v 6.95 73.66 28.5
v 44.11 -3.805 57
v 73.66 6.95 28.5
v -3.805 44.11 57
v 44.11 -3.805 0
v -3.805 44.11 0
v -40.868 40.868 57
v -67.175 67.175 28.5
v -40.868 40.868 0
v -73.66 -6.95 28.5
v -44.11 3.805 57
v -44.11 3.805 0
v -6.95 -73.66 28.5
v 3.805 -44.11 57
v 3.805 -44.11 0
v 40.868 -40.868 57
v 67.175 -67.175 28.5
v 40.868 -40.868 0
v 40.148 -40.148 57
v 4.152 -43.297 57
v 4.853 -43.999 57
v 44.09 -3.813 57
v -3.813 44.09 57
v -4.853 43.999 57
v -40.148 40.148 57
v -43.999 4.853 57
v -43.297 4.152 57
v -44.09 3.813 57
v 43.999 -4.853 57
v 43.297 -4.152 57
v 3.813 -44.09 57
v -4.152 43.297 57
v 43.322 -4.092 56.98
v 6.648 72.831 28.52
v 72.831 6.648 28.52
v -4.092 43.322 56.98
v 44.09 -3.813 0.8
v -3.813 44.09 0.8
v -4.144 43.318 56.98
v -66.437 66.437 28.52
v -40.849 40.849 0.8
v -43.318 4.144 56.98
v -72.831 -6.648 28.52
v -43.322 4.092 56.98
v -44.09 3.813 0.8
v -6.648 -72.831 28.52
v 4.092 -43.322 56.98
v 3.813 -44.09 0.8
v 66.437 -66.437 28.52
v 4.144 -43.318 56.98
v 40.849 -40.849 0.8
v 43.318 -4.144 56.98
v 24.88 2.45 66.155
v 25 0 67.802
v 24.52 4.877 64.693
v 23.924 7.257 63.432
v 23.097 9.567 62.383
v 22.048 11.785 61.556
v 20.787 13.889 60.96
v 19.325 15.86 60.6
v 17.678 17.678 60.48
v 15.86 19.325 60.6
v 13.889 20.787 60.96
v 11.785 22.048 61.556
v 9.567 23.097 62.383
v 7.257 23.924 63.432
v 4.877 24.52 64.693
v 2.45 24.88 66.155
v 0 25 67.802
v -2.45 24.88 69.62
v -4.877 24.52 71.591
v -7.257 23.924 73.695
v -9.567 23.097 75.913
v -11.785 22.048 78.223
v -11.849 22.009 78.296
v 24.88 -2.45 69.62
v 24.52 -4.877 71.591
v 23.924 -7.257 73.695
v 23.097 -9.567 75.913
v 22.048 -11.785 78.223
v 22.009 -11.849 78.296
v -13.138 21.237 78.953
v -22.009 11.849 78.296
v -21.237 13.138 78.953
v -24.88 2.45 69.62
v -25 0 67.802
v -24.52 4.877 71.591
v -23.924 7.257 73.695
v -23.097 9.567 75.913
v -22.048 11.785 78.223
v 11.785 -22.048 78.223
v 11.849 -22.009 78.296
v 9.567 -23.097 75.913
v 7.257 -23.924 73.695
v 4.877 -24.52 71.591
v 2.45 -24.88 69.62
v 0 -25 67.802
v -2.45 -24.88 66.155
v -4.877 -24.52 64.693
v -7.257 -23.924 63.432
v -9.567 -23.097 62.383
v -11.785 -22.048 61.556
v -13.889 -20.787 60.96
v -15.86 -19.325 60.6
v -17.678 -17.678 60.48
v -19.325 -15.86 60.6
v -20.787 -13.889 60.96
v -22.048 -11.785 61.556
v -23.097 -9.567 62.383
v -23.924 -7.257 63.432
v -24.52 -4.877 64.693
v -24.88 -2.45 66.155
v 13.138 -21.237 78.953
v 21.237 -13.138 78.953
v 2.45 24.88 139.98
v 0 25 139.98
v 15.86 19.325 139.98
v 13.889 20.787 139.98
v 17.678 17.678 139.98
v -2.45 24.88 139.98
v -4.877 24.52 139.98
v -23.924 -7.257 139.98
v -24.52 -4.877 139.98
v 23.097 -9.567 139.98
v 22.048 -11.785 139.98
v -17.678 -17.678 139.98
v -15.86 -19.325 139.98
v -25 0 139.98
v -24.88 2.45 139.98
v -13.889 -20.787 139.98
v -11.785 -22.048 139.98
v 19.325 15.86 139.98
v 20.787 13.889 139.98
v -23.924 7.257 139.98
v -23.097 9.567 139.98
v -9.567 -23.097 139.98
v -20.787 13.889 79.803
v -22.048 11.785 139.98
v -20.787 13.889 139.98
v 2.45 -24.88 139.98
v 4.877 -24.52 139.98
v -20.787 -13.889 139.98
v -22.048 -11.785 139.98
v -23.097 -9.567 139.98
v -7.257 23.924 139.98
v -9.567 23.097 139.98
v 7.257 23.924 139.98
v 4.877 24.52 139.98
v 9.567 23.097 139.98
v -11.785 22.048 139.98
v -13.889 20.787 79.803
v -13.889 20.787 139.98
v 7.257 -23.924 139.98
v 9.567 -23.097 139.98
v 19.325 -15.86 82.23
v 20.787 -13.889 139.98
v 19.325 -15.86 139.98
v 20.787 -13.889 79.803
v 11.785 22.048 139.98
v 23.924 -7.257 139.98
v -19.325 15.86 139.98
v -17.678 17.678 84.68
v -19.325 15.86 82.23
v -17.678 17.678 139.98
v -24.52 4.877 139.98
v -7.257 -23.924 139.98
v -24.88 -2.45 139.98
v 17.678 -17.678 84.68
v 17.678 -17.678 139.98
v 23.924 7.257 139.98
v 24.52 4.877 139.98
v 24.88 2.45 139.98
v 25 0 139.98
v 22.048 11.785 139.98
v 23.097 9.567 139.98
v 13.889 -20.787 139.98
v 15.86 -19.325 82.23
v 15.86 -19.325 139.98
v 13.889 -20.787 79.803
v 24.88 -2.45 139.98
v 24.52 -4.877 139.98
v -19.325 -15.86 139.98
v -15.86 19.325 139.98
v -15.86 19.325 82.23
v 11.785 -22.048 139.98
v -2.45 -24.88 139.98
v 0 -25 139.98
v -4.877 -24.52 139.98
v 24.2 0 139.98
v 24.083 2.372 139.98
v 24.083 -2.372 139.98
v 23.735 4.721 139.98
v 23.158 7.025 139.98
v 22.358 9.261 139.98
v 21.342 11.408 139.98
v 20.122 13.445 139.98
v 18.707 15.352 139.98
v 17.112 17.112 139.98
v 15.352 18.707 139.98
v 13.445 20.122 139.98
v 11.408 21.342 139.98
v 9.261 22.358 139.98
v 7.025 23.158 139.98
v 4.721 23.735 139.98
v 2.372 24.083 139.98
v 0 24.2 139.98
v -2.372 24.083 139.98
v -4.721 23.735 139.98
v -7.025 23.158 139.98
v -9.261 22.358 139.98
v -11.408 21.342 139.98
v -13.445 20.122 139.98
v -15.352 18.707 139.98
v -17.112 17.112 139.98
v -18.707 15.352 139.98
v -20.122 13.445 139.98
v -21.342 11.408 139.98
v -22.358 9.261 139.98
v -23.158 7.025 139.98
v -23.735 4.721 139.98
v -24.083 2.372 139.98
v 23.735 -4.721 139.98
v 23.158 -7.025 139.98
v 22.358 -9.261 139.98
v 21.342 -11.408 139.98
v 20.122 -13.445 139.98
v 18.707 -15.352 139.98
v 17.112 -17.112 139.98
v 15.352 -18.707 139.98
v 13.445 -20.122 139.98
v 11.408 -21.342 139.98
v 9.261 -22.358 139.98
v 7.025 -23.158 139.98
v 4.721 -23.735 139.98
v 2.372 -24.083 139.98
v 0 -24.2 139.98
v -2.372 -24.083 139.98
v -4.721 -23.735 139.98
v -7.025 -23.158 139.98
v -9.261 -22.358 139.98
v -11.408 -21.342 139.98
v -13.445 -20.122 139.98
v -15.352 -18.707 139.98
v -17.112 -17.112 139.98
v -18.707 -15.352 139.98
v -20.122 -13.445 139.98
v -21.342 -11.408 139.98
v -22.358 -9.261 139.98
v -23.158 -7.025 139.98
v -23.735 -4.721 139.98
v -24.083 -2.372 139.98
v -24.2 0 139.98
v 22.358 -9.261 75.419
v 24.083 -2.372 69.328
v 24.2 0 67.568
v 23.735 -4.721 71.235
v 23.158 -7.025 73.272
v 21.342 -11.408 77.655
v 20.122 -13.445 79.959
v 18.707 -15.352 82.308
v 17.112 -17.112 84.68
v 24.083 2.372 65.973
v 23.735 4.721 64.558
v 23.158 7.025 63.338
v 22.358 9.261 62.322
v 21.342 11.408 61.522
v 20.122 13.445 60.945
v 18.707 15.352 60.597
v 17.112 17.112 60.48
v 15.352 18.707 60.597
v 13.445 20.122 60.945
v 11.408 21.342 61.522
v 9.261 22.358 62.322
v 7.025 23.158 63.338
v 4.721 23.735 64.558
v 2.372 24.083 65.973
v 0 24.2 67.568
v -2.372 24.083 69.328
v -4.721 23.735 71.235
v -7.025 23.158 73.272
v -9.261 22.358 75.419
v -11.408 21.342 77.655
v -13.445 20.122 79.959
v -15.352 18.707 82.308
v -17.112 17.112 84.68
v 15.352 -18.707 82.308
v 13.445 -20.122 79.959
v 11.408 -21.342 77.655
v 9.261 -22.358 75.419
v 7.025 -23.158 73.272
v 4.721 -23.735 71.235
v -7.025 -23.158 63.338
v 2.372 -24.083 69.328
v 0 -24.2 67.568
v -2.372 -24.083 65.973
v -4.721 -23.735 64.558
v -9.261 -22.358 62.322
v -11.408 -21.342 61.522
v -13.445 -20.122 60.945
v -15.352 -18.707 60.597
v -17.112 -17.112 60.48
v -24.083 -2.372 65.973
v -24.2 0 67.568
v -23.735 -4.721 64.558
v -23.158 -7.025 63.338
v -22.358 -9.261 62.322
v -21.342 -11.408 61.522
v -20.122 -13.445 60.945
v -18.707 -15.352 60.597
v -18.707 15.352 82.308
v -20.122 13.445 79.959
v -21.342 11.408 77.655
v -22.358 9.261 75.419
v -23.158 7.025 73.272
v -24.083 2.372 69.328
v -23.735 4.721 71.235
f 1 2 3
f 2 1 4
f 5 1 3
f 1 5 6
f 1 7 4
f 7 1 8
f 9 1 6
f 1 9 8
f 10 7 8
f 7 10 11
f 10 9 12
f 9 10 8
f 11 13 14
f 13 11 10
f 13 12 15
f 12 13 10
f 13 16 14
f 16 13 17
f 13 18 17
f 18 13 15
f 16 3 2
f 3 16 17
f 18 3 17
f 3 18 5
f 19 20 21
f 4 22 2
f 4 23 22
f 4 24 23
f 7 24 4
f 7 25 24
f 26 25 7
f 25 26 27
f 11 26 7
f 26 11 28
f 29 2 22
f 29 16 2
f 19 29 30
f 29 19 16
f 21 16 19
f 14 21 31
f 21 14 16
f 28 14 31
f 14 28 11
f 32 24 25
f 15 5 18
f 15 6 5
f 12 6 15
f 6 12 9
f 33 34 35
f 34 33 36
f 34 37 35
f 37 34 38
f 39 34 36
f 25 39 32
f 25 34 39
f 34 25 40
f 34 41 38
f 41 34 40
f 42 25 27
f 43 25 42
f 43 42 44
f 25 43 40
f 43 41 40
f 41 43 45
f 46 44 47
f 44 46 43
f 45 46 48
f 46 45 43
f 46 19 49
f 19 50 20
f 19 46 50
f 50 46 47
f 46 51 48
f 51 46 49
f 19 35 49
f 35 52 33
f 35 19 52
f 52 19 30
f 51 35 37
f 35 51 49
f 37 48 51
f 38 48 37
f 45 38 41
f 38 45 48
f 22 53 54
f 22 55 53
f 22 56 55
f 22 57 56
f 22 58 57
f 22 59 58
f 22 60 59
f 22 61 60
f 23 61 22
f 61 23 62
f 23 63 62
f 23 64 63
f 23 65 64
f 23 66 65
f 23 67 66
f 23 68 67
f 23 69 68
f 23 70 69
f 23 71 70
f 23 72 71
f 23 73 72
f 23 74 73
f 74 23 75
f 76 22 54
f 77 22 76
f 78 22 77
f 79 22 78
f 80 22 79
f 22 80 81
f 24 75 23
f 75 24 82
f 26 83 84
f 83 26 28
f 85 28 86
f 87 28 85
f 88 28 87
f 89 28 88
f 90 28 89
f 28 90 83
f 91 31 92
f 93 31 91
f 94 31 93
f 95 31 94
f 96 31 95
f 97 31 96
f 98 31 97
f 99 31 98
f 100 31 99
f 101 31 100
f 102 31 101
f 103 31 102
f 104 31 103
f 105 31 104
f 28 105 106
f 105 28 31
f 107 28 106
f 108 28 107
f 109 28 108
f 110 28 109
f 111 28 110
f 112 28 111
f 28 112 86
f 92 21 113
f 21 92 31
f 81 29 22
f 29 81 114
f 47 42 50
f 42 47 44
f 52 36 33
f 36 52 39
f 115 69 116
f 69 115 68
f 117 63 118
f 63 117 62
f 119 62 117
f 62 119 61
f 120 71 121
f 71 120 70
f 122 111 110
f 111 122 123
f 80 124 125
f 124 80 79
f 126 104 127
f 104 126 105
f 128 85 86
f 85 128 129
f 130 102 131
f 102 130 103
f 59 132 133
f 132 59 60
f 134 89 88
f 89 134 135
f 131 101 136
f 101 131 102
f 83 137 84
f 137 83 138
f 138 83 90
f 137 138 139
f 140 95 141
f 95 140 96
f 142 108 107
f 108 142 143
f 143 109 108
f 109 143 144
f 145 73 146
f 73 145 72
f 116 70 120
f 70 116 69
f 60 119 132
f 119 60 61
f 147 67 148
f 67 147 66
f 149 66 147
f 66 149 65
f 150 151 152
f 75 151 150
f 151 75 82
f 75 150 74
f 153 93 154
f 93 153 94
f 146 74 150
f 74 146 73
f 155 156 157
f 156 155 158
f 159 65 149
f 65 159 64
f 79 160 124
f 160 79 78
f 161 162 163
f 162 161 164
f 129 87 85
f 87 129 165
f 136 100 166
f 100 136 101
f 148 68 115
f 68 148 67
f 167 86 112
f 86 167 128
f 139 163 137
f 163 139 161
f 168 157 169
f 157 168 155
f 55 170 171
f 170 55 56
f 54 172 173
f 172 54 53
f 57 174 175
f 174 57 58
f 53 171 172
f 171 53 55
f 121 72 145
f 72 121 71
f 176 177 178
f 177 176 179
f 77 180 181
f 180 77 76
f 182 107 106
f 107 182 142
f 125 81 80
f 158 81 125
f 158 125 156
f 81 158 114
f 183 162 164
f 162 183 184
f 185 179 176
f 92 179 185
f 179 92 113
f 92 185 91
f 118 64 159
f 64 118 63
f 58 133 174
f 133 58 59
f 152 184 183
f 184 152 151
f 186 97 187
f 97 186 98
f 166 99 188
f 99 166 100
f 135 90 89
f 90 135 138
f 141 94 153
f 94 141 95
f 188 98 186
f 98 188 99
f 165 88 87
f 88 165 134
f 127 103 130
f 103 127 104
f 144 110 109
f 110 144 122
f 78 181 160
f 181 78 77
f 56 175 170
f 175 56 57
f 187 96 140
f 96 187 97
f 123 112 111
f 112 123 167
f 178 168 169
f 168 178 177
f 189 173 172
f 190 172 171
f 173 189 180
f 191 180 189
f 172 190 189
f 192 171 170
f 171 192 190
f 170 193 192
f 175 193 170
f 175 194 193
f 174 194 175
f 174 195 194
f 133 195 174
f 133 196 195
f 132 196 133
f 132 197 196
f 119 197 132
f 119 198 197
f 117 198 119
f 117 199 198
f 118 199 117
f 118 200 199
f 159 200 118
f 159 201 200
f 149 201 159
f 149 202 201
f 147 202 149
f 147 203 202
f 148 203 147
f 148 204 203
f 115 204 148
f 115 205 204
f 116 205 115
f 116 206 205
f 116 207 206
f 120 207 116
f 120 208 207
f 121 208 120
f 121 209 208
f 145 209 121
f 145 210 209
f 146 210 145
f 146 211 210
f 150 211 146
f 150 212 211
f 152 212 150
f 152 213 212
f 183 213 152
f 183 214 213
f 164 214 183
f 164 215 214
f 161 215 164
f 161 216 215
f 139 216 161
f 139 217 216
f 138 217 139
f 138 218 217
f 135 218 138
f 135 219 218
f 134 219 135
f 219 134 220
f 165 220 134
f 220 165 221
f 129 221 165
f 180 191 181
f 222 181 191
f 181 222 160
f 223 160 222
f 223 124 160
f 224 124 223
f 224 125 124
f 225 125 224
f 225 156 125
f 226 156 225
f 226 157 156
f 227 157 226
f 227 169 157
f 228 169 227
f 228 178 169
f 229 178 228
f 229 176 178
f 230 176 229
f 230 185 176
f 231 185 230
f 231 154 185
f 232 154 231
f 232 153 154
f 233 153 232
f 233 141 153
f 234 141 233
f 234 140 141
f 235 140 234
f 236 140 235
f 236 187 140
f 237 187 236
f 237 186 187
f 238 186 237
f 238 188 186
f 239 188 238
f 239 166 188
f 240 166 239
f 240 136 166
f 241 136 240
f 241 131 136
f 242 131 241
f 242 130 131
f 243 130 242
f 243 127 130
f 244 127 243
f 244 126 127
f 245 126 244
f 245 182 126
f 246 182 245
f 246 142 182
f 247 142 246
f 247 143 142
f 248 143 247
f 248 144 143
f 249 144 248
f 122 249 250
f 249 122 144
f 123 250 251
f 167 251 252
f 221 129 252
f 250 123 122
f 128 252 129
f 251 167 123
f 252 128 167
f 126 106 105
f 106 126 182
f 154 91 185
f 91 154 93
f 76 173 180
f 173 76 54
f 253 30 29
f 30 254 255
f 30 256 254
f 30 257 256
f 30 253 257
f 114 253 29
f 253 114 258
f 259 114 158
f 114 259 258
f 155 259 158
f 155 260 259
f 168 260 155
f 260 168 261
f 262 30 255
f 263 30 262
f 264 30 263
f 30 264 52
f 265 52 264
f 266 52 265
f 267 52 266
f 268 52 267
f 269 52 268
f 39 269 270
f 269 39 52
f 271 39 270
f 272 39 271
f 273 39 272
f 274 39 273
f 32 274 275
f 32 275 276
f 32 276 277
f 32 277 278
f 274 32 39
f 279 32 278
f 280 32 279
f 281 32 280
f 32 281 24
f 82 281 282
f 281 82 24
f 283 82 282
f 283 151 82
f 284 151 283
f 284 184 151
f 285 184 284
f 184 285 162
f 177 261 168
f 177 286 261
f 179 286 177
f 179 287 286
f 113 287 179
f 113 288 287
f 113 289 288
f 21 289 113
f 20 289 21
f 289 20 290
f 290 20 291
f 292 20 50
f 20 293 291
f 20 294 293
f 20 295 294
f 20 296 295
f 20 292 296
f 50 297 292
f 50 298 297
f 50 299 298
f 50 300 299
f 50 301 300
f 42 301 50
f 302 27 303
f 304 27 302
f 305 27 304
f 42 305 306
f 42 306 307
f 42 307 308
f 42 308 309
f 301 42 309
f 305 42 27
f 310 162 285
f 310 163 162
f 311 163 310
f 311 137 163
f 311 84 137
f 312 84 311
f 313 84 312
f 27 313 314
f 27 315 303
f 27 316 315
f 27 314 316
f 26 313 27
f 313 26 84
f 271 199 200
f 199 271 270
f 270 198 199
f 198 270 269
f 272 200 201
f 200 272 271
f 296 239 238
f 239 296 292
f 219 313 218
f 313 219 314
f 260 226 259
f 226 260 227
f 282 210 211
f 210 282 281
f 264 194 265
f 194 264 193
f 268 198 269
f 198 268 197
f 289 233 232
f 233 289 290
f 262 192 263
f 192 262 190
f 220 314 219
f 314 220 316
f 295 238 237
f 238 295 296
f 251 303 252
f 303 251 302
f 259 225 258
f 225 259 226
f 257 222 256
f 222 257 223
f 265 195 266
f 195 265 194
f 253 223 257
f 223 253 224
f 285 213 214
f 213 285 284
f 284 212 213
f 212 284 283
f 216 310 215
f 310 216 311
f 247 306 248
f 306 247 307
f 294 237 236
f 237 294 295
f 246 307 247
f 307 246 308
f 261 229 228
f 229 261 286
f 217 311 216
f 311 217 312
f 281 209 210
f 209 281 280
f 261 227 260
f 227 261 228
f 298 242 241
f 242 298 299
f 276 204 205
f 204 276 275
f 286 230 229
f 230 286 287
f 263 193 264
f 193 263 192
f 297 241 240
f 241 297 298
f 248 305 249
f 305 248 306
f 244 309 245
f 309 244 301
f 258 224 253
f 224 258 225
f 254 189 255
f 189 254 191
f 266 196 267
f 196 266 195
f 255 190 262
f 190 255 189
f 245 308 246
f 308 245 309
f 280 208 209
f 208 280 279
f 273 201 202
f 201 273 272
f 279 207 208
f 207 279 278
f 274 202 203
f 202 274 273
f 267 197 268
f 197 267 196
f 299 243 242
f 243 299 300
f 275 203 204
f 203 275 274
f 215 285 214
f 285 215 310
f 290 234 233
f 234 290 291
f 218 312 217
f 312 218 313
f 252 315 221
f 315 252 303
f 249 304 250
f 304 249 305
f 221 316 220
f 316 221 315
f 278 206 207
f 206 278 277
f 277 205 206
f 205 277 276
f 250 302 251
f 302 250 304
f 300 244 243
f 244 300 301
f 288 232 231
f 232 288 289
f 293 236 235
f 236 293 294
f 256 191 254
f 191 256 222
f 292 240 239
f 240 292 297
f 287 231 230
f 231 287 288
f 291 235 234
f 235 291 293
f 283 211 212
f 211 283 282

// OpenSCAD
// [FL_INDEX: keywords="openscad, 3d_parametric, Customizable_Rupee_Lamp_Shade, csg_solid" | COT="Parametric OpenSCAD design from 3DCodeverse"]
// Title: Customizable Rupee Lamp Shade

//----- Customizable constants

// preview[view:south, tilt:top]

/* [Printer/Slicer] */

// of the target printer
nozzle_diameter= 0.4;

// to be used by the slicer
layer_height= 0.2;

/* [Rupee Shape] */

rupee_length= 190;
rupee_edge_pitch= 45;
rupee_tip_angle= 100;
rupee_aspect_ratio= 0.6;
rupee_center_facet_ratio= 0.5;

rupee_bowl_wall_count= 2;
rupee_bowl_floor_count= 4; // NOTE: An even number of layers promotes symmetry on the central facet.

/* [Light Socket Connector] */

rupee_shade_total_height= 140;

light_socket_connector_top_diameter= 50;
light_socket_connector_face_count= 64;

/* [Hidden] */

// The connector slits was both unnecessary and created problems while printing.
light_socket_connector_slit_xy_size= 0; // 0 will remove the slit entirely. 

// The magnets turned out to be unnecessary, so it's completely untested.
light_socket_connector_magnet_count= 0;
magnet_diameter= 5.0;
magnet_socket_xy_gap= 0.1;
magnet_socket_z_gap= 0.2;
magnet_socket_wall_count= 2;
magnet_socket_floor_count= 2;
magnet_socket_ceiling_count= 2; // Either 0 if glueing in magnets, or just thick enough to ensure the magnets are contained.
magnet_socket_support_pitch= 45;
magnet_socket_face_count= 64;

//----- Private constants

function hidden(x)= x; // Used to hide values from the customizer app.

csg_overlap= hidden(0.02);

rupee_bowl_wall_xy_size= (nozzle_diameter * rupee_bowl_wall_count);
rupee_bowl_floor_z_size= (layer_height * rupee_bowl_floor_count);

rupee_y_size= rupee_length;
rupee_x_size= (rupee_y_size * rupee_aspect_ratio);

rupee_center_facet_x_size= (rupee_center_facet_ratio * rupee_x_size);

rupee_edge_facet_x_size= ((rupee_x_size / 2) - (rupee_center_facet_x_size / 2));
rupee_edge_facet_z_size= (rupee_edge_facet_x_size * tan(rupee_edge_pitch));

rupee_z_size= (2 * rupee_edge_facet_z_size);

rupee_max_size= (max(rupee_x_size, rupee_y_size, rupee_z_size) + (2 * csg_overlap));

light_socket_connector_z_size= (rupee_shade_total_height - rupee_z_size);

light_socket_connector_top_radius= (light_socket_connector_top_diameter / 2);

magnet_socket_cavity_xy_radius= ((magnet_diameter / 2) + magnet_socket_xy_gap);
magnet_socket_cavity_z_size= (magnet_socket_z_gap + magnet_diameter + magnet_socket_z_gap);
magnet_socket_wall_xy_size= (nozzle_diameter * magnet_socket_wall_count);
magnet_socket_floor_z_size= (layer_height * magnet_socket_floor_count);
magnet_socket_ceiling_z_size= (layer_height * magnet_socket_ceiling_count);

magnet_socket_xy_radius= (magnet_socket_cavity_xy_radius + magnet_socket_wall_xy_size);
magnet_socket_z_size= (magnet_socket_floor_z_size + magnet_socket_cavity_z_size + magnet_socket_ceiling_z_size);

magnet_socket_support_z_size= ((2 * magnet_socket_xy_radius) * tan(magnet_socket_support_pitch));

//----- Information

echo("rupee_center_facet_x_size:", rupee_center_facet_x_size);
echo("rupee_z_size:", rupee_z_size);
echo("magnet_insertion pause_at_z:", (rupee_shade_total_height - magnet_socket_ceiling_z_size));

//----- Implementation

module rupee_negative_top_edge()
{
	clipping_cube_x_size= (rupee_x_size / cos(rupee_edge_pitch));
	
	rotate([0, rupee_edge_pitch, 0])
	translate([-(clipping_cube_x_size / 2), -(rupee_max_size / 2), 0])
	cube(size= [
		clipping_cube_x_size,
		rupee_max_size,
		rupee_max_size]);
}

module rupee_negative_full_edge(
	xy_inset_size)
{
	translate([-xy_inset_size, 0, 0])
	{
		rupee_negative_top_edge();
		
		mirror([0, 0, 1])
		rupee_negative_top_edge();
	}
}

module rupee_negative_edges(
	xy_inset_size)
{
	// Right
	translate([(rupee_x_size / 2), 0, 0])
	rupee_negative_full_edge(xy_inset_size);
	
	// Top-Right
	translate([0, (rupee_y_size / 2), 0])
	rotate([0, 0, (rupee_tip_angle / 2)])
	rupee_negative_full_edge(xy_inset_size);
	
	// Top-Left
	translate([0, (rupee_y_size / 2), 0])
	mirror([1, 0, 0])
	rotate([0, 0, (rupee_tip_angle / 2)])
	rupee_negative_full_edge(xy_inset_size);
	
	// Left
	translate([-(rupee_x_size / 2), 0, 0])
	mirror([1, 0, 0])
	rupee_negative_full_edge(xy_inset_size);
	
	// Bottom-Left
	translate([0, -(rupee_y_size / 2), 0])
	mirror([1, 0, 0])
	rotate([0, 0, -(rupee_tip_angle / 2)])
	rupee_negative_full_edge(xy_inset_size);
	
	// Bottom-Right
	translate([0, -(rupee_y_size / 2), 0])
	rotate([0, 0, -(rupee_tip_angle / 2)])
	rupee_negative_full_edge(xy_inset_size);
}

module rupee_solid(
	xy_inset_size)
{
	translate([0, 0, (rupee_z_size / 2)])
	difference()
	{
		cube(
			size= [rupee_x_size, rupee_y_size, rupee_z_size],
			center= true);
		
		rupee_negative_edges(xy_inset_size= xy_inset_size);
	}
}

module rupee_bowl()
{
	difference()
	{
		rupee_solid(xy_inset_size= 0);
		
		difference()
		{
			translate([0, 0, csg_overlap])
			rupee_solid(
				xy_inset_size= rupee_bowl_wall_xy_size);
			
			translate([-(rupee_max_size / 2), -(rupee_max_size / 2), 0])
			cube(size= [
				rupee_max_size,
				rupee_max_size,
				rupee_bowl_floor_z_size]);
		}
	}
}

module magnet_socket()
{
	difference()
	{
		translate([
			-magnet_socket_xy_radius,
			0,
			-(magnet_socket_z_size + magnet_socket_support_z_size)])
		union()
		{
			cylinder(
				r= magnet_socket_xy_radius,
				h= (magnet_socket_z_size + magnet_socket_support_z_size),
				$fn= magnet_socket_face_count);
			
			translate([0, -magnet_socket_xy_radius, 0])
			cube(size= [
				magnet_socket_xy_radius,
				(2 * magnet_socket_xy_radius), 
				(magnet_socket_z_size + magnet_socket_support_z_size)]);
		}
		
		// Magnet cavity.
		translate([
			-magnet_socket_xy_radius,
			0,
			-(magnet_socket_cavity_z_size + magnet_socket_ceiling_z_size)])
		cylinder(
			r= magnet_socket_cavity_xy_radius,
			h= magnet_socket_cavity_z_size,
			$fn= magnet_socket_face_count);
			
		// Support bevel
		translate([
			-(2 * magnet_socket_xy_radius),
			0,
			-magnet_socket_z_size])
		rotate([0, -(90 - magnet_socket_support_pitch), 0])
		translate([
			-magnet_socket_support_z_size,
			-magnet_socket_xy_radius,
			-(2 * magnet_socket_support_z_size)])
		translate([0, -csg_overlap, 0])
		cube(size= [
			magnet_socket_support_z_size,
			((2 * magnet_socket_xy_radius) + (2 * csg_overlap)),
			(2 * magnet_socket_support_z_size)]);
	}
}

module light_socket_connector_exterior()
{
	cylinder(
		r= light_socket_connector_top_radius,
		h= light_socket_connector_z_size,
		$fn= light_socket_connector_face_count);
		
	difference()
	{
		translate([
			-(rupee_center_facet_x_size / 2),
			-(rupee_y_size / 2),
			0])
		cube(size= [
			rupee_center_facet_x_size,
			rupee_y_size,
			min((rupee_z_size / 2), light_socket_connector_z_size)]);
		
		translate([0, 0, -(rupee_z_size / 2)])
		rupee_negative_edges(xy_inset_size= 0);
	}
}

module light_socket_connector_negative_interior()
{
	translate([0, 0, -csg_overlap])
	cylinder(
		r= (light_socket_connector_top_radius - rupee_bowl_wall_xy_size),
		h= (csg_overlap + light_socket_connector_z_size + csg_overlap),
		$fn= light_socket_connector_face_count);
			
	intersection()
	{
		// Base X-Positive
		translate([((rupee_center_facet_x_size / 2) - rupee_bowl_wall_xy_size), 0, 0])
		rotate([0, -(90 - rupee_edge_pitch), 0])
		mirror([1, 0, 0])
		translate([0, -(rupee_max_size / 2), 0])
		cube(size= rupee_max_size);
		
		// Base X-Negative
		mirror([1, 0, 0])
		translate([((rupee_center_facet_x_size / 2) - rupee_bowl_wall_xy_size), 0, 0])
		rotate([0, -(90 - rupee_edge_pitch), 0])
		mirror([1, 0, 0])
		translate([0, -(rupee_max_size / 2), 0])
		cube(size= rupee_max_size);
	}
	
	// If the user needs the connector to be split to
	// allow the bulb to pass through.
	if (light_socket_connector_slit_xy_size > 0)
	{
		translate([
			-(light_socket_connector_slit_xy_size / 2),
			-(rupee_max_size / 2),
			0])
		cube(size= [
			light_socket_connector_slit_xy_size,
			rupee_max_size,
			(light_socket_connector_z_size + csg_overlap)]);
	}
}

module light_socket_connector_magnet_sockets()
{
	magnet_placement_angle= (360 / light_socket_connector_magnet_count);
	
	// NOTE: We must perform this check, otherwise the
	// culling-cylinder will become the only child passed
	// to intersection().
	if (light_socket_connector_magnet_count > 0)
	{
		intersection()
		{
			translate([0, 0, light_socket_connector_z_size])
			union()
			{
				for (index= [0 : (light_socket_connector_magnet_count - 1)])
				{
					rotate([0, 0, (90 + (index * magnet_placement_angle) + (magnet_placement_angle / 2))])
					translate([csg_overlap, 0, 0])
					translate([(light_socket_connector_top_radius - rupee_bowl_wall_xy_size), 0, 0])
					magnet_socket();
				}
			}
			
			// Ensure the magnet sockets don't poke out.
			cylinder(
				r= light_socket_connector_top_radius,
				h= light_socket_connector_z_size,
				$fn= light_socket_connector_face_count);
		}
	}
}

module light_socket_connector_whole()
{
	union()
	{
		difference()
		{
			light_socket_connector_exterior();
			
			light_socket_connector_negative_interior();
		}
		
		light_socket_connector_magnet_sockets();
	}
}

module rupee_shade()
{
	union()
	{
		rupee_bowl();

		translate([0, 0, -csg_overlap])
		translate([0, 0, rupee_z_size])
		light_socket_connector_whole();
	}
}

//----- Output

rotate([0, 0, 45]) // Rotate to better fit in the printer, while keeping the bottom-fill symmetrical to look nice. (could fit better with a different angle, but the bottom surface would be asymmetrical)
//rupee_bowl();
//light_socket_connector_whole();
rupee_shade();
